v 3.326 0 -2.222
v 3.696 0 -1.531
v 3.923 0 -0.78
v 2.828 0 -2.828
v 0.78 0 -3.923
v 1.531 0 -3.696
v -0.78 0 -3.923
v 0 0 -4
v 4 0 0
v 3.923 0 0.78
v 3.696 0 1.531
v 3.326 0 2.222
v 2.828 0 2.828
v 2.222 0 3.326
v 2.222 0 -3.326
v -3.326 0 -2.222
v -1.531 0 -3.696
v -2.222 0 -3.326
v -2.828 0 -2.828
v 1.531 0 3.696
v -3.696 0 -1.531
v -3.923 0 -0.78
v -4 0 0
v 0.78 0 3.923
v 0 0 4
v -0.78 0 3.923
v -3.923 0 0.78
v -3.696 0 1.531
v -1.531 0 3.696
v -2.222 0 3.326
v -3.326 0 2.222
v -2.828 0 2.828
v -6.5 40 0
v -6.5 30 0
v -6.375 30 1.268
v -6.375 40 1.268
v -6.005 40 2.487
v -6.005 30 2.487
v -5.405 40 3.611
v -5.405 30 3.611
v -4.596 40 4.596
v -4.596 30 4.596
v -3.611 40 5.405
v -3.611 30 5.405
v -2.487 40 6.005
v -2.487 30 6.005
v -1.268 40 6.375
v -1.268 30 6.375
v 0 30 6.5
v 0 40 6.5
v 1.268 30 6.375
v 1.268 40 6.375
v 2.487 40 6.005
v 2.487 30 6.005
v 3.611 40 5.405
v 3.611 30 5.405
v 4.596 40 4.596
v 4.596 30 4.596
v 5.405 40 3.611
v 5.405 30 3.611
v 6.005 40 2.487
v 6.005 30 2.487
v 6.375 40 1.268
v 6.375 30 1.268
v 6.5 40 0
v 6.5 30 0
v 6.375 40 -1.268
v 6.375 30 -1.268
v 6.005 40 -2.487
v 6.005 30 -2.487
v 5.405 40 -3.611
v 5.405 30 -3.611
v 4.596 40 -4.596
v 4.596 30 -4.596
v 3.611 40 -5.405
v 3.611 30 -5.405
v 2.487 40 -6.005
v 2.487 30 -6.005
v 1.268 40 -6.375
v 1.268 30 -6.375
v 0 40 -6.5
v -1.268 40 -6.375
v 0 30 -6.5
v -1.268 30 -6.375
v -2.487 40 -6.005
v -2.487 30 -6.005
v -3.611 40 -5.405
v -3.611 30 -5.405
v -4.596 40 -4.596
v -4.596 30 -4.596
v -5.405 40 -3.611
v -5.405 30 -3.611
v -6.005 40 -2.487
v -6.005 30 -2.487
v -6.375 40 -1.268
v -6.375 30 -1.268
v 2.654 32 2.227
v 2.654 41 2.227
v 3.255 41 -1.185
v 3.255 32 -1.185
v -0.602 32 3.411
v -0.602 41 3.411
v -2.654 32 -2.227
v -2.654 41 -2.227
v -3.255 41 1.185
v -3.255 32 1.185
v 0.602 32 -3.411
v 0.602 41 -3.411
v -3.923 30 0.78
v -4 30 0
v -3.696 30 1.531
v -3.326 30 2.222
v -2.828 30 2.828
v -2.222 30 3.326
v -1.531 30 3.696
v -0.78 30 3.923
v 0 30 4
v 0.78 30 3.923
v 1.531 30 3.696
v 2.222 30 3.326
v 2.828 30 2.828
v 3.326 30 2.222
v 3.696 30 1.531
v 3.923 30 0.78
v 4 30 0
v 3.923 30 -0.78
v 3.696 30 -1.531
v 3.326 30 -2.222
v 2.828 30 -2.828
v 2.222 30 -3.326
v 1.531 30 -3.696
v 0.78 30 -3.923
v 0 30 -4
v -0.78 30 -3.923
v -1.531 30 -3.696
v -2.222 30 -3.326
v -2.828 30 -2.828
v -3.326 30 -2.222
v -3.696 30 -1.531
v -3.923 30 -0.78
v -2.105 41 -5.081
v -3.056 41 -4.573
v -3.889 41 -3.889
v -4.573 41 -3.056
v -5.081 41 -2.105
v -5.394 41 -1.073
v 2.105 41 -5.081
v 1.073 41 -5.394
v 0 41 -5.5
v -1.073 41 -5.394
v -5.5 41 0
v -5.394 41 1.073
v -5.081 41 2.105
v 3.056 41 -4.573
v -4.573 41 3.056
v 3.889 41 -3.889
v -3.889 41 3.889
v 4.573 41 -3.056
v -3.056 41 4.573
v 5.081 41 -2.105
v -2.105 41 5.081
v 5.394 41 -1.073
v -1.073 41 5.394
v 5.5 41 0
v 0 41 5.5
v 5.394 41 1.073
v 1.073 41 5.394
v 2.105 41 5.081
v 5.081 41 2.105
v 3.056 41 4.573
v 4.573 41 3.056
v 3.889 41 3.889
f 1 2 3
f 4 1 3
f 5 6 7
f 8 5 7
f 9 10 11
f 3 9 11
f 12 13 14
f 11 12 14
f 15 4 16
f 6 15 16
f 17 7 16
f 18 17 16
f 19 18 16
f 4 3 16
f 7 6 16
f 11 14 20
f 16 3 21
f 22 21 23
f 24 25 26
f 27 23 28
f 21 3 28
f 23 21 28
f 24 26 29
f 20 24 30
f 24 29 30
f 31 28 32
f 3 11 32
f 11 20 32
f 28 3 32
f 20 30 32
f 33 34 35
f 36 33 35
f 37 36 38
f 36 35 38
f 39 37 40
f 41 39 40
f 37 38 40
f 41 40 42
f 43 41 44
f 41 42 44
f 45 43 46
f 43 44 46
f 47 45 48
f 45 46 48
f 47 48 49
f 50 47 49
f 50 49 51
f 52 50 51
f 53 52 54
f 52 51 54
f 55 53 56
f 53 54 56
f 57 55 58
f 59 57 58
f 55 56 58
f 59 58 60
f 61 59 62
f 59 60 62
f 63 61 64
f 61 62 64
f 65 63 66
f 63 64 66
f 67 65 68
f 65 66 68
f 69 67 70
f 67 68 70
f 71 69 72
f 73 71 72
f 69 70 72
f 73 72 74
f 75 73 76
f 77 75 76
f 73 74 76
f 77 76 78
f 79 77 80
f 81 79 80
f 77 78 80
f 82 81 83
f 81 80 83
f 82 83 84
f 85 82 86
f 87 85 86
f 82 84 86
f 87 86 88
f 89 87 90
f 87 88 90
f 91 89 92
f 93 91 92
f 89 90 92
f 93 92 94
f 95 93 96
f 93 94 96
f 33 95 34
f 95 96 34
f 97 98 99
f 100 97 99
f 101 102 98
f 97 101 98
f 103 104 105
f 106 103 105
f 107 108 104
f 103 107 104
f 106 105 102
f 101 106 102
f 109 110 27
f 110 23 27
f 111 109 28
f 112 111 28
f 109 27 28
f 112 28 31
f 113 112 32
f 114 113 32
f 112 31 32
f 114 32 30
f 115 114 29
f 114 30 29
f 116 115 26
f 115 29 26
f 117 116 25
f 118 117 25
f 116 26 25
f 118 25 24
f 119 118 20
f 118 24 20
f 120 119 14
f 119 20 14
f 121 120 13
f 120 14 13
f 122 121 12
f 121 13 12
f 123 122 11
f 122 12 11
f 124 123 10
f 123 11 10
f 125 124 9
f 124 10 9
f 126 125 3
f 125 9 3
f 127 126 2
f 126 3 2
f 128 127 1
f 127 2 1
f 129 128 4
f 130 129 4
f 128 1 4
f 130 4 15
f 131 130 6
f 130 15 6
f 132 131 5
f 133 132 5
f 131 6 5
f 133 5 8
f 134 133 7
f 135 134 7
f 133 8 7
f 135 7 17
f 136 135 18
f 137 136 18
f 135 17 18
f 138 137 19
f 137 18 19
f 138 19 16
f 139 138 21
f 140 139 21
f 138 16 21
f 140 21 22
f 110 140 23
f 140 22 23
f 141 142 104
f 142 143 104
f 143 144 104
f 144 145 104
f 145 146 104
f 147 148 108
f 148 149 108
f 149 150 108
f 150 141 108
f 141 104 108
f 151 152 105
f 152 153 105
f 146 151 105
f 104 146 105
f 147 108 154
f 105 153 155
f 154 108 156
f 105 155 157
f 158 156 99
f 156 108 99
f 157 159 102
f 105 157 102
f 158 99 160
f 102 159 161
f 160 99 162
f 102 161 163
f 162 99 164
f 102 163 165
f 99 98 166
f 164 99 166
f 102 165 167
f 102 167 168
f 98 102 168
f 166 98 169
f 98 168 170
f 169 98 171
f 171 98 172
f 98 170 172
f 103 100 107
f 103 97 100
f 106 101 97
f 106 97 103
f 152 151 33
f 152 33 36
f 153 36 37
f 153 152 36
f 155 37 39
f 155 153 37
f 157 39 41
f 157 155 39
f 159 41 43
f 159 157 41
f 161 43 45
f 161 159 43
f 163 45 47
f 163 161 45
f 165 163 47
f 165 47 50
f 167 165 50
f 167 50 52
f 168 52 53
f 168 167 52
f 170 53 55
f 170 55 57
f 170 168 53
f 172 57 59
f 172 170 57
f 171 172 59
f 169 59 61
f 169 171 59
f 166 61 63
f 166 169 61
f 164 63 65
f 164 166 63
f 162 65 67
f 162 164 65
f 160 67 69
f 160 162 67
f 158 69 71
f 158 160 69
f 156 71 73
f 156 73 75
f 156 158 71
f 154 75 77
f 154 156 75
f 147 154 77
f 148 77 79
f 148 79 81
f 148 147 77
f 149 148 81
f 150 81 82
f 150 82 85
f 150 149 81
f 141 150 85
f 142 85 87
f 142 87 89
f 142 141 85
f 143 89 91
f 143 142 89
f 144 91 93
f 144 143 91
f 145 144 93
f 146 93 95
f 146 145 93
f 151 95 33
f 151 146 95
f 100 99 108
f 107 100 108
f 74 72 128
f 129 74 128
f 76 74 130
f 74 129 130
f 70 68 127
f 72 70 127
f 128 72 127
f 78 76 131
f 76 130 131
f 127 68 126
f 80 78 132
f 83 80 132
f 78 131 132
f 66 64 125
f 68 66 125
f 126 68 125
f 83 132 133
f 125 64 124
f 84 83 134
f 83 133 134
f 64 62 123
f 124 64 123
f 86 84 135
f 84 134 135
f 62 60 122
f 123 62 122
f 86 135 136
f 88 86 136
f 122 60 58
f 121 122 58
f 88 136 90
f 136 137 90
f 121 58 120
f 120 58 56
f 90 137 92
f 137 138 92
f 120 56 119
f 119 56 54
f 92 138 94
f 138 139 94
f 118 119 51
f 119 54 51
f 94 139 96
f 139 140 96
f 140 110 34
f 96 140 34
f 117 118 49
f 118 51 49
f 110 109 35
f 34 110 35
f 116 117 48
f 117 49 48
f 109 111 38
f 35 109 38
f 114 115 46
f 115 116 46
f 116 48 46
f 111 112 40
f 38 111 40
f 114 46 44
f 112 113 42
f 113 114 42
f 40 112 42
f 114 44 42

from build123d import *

# Parameters (mm, degrees)
F3_DEPTH = 9
F4_SIZE  = 1


with BuildPart() as f1:
    # F0 (on Top) → F1 (revolve)
    with BuildSketch(Plane.XY):
        Polygon((-4, 0), (0, 0), (0, 41), (-6.5, 41), (-6.5, 30), (-4, 30), align=None)
    revolve(axis=Axis((0, 20.5, 0), (0, 1, 0)))

    # F2 (on face) → F3 (cut)
    with BuildSketch(Plane(origin=(0, 41, 0), x_dir=(-1, 0, 0), z_dir=(0, 1, 0))):
        Polygon((-3.255243, -1.184649), (-0.601686, -3.411448), (2.653557, -2.226799), (3.255243, 1.184649), (0.601686, 3.411448), (-2.653557, 2.226799), align=None)
    extrude(amount=-F3_DEPTH, mode=Mode.SUBTRACT)

    # F4
    f4_edges = [f1.edges().sort_by_distance(p)[0] for p in [
        (6.5, 41, 0),
    ]]
    chamfer(f4_edges, length=F4_SIZE)


solid = f1.part
